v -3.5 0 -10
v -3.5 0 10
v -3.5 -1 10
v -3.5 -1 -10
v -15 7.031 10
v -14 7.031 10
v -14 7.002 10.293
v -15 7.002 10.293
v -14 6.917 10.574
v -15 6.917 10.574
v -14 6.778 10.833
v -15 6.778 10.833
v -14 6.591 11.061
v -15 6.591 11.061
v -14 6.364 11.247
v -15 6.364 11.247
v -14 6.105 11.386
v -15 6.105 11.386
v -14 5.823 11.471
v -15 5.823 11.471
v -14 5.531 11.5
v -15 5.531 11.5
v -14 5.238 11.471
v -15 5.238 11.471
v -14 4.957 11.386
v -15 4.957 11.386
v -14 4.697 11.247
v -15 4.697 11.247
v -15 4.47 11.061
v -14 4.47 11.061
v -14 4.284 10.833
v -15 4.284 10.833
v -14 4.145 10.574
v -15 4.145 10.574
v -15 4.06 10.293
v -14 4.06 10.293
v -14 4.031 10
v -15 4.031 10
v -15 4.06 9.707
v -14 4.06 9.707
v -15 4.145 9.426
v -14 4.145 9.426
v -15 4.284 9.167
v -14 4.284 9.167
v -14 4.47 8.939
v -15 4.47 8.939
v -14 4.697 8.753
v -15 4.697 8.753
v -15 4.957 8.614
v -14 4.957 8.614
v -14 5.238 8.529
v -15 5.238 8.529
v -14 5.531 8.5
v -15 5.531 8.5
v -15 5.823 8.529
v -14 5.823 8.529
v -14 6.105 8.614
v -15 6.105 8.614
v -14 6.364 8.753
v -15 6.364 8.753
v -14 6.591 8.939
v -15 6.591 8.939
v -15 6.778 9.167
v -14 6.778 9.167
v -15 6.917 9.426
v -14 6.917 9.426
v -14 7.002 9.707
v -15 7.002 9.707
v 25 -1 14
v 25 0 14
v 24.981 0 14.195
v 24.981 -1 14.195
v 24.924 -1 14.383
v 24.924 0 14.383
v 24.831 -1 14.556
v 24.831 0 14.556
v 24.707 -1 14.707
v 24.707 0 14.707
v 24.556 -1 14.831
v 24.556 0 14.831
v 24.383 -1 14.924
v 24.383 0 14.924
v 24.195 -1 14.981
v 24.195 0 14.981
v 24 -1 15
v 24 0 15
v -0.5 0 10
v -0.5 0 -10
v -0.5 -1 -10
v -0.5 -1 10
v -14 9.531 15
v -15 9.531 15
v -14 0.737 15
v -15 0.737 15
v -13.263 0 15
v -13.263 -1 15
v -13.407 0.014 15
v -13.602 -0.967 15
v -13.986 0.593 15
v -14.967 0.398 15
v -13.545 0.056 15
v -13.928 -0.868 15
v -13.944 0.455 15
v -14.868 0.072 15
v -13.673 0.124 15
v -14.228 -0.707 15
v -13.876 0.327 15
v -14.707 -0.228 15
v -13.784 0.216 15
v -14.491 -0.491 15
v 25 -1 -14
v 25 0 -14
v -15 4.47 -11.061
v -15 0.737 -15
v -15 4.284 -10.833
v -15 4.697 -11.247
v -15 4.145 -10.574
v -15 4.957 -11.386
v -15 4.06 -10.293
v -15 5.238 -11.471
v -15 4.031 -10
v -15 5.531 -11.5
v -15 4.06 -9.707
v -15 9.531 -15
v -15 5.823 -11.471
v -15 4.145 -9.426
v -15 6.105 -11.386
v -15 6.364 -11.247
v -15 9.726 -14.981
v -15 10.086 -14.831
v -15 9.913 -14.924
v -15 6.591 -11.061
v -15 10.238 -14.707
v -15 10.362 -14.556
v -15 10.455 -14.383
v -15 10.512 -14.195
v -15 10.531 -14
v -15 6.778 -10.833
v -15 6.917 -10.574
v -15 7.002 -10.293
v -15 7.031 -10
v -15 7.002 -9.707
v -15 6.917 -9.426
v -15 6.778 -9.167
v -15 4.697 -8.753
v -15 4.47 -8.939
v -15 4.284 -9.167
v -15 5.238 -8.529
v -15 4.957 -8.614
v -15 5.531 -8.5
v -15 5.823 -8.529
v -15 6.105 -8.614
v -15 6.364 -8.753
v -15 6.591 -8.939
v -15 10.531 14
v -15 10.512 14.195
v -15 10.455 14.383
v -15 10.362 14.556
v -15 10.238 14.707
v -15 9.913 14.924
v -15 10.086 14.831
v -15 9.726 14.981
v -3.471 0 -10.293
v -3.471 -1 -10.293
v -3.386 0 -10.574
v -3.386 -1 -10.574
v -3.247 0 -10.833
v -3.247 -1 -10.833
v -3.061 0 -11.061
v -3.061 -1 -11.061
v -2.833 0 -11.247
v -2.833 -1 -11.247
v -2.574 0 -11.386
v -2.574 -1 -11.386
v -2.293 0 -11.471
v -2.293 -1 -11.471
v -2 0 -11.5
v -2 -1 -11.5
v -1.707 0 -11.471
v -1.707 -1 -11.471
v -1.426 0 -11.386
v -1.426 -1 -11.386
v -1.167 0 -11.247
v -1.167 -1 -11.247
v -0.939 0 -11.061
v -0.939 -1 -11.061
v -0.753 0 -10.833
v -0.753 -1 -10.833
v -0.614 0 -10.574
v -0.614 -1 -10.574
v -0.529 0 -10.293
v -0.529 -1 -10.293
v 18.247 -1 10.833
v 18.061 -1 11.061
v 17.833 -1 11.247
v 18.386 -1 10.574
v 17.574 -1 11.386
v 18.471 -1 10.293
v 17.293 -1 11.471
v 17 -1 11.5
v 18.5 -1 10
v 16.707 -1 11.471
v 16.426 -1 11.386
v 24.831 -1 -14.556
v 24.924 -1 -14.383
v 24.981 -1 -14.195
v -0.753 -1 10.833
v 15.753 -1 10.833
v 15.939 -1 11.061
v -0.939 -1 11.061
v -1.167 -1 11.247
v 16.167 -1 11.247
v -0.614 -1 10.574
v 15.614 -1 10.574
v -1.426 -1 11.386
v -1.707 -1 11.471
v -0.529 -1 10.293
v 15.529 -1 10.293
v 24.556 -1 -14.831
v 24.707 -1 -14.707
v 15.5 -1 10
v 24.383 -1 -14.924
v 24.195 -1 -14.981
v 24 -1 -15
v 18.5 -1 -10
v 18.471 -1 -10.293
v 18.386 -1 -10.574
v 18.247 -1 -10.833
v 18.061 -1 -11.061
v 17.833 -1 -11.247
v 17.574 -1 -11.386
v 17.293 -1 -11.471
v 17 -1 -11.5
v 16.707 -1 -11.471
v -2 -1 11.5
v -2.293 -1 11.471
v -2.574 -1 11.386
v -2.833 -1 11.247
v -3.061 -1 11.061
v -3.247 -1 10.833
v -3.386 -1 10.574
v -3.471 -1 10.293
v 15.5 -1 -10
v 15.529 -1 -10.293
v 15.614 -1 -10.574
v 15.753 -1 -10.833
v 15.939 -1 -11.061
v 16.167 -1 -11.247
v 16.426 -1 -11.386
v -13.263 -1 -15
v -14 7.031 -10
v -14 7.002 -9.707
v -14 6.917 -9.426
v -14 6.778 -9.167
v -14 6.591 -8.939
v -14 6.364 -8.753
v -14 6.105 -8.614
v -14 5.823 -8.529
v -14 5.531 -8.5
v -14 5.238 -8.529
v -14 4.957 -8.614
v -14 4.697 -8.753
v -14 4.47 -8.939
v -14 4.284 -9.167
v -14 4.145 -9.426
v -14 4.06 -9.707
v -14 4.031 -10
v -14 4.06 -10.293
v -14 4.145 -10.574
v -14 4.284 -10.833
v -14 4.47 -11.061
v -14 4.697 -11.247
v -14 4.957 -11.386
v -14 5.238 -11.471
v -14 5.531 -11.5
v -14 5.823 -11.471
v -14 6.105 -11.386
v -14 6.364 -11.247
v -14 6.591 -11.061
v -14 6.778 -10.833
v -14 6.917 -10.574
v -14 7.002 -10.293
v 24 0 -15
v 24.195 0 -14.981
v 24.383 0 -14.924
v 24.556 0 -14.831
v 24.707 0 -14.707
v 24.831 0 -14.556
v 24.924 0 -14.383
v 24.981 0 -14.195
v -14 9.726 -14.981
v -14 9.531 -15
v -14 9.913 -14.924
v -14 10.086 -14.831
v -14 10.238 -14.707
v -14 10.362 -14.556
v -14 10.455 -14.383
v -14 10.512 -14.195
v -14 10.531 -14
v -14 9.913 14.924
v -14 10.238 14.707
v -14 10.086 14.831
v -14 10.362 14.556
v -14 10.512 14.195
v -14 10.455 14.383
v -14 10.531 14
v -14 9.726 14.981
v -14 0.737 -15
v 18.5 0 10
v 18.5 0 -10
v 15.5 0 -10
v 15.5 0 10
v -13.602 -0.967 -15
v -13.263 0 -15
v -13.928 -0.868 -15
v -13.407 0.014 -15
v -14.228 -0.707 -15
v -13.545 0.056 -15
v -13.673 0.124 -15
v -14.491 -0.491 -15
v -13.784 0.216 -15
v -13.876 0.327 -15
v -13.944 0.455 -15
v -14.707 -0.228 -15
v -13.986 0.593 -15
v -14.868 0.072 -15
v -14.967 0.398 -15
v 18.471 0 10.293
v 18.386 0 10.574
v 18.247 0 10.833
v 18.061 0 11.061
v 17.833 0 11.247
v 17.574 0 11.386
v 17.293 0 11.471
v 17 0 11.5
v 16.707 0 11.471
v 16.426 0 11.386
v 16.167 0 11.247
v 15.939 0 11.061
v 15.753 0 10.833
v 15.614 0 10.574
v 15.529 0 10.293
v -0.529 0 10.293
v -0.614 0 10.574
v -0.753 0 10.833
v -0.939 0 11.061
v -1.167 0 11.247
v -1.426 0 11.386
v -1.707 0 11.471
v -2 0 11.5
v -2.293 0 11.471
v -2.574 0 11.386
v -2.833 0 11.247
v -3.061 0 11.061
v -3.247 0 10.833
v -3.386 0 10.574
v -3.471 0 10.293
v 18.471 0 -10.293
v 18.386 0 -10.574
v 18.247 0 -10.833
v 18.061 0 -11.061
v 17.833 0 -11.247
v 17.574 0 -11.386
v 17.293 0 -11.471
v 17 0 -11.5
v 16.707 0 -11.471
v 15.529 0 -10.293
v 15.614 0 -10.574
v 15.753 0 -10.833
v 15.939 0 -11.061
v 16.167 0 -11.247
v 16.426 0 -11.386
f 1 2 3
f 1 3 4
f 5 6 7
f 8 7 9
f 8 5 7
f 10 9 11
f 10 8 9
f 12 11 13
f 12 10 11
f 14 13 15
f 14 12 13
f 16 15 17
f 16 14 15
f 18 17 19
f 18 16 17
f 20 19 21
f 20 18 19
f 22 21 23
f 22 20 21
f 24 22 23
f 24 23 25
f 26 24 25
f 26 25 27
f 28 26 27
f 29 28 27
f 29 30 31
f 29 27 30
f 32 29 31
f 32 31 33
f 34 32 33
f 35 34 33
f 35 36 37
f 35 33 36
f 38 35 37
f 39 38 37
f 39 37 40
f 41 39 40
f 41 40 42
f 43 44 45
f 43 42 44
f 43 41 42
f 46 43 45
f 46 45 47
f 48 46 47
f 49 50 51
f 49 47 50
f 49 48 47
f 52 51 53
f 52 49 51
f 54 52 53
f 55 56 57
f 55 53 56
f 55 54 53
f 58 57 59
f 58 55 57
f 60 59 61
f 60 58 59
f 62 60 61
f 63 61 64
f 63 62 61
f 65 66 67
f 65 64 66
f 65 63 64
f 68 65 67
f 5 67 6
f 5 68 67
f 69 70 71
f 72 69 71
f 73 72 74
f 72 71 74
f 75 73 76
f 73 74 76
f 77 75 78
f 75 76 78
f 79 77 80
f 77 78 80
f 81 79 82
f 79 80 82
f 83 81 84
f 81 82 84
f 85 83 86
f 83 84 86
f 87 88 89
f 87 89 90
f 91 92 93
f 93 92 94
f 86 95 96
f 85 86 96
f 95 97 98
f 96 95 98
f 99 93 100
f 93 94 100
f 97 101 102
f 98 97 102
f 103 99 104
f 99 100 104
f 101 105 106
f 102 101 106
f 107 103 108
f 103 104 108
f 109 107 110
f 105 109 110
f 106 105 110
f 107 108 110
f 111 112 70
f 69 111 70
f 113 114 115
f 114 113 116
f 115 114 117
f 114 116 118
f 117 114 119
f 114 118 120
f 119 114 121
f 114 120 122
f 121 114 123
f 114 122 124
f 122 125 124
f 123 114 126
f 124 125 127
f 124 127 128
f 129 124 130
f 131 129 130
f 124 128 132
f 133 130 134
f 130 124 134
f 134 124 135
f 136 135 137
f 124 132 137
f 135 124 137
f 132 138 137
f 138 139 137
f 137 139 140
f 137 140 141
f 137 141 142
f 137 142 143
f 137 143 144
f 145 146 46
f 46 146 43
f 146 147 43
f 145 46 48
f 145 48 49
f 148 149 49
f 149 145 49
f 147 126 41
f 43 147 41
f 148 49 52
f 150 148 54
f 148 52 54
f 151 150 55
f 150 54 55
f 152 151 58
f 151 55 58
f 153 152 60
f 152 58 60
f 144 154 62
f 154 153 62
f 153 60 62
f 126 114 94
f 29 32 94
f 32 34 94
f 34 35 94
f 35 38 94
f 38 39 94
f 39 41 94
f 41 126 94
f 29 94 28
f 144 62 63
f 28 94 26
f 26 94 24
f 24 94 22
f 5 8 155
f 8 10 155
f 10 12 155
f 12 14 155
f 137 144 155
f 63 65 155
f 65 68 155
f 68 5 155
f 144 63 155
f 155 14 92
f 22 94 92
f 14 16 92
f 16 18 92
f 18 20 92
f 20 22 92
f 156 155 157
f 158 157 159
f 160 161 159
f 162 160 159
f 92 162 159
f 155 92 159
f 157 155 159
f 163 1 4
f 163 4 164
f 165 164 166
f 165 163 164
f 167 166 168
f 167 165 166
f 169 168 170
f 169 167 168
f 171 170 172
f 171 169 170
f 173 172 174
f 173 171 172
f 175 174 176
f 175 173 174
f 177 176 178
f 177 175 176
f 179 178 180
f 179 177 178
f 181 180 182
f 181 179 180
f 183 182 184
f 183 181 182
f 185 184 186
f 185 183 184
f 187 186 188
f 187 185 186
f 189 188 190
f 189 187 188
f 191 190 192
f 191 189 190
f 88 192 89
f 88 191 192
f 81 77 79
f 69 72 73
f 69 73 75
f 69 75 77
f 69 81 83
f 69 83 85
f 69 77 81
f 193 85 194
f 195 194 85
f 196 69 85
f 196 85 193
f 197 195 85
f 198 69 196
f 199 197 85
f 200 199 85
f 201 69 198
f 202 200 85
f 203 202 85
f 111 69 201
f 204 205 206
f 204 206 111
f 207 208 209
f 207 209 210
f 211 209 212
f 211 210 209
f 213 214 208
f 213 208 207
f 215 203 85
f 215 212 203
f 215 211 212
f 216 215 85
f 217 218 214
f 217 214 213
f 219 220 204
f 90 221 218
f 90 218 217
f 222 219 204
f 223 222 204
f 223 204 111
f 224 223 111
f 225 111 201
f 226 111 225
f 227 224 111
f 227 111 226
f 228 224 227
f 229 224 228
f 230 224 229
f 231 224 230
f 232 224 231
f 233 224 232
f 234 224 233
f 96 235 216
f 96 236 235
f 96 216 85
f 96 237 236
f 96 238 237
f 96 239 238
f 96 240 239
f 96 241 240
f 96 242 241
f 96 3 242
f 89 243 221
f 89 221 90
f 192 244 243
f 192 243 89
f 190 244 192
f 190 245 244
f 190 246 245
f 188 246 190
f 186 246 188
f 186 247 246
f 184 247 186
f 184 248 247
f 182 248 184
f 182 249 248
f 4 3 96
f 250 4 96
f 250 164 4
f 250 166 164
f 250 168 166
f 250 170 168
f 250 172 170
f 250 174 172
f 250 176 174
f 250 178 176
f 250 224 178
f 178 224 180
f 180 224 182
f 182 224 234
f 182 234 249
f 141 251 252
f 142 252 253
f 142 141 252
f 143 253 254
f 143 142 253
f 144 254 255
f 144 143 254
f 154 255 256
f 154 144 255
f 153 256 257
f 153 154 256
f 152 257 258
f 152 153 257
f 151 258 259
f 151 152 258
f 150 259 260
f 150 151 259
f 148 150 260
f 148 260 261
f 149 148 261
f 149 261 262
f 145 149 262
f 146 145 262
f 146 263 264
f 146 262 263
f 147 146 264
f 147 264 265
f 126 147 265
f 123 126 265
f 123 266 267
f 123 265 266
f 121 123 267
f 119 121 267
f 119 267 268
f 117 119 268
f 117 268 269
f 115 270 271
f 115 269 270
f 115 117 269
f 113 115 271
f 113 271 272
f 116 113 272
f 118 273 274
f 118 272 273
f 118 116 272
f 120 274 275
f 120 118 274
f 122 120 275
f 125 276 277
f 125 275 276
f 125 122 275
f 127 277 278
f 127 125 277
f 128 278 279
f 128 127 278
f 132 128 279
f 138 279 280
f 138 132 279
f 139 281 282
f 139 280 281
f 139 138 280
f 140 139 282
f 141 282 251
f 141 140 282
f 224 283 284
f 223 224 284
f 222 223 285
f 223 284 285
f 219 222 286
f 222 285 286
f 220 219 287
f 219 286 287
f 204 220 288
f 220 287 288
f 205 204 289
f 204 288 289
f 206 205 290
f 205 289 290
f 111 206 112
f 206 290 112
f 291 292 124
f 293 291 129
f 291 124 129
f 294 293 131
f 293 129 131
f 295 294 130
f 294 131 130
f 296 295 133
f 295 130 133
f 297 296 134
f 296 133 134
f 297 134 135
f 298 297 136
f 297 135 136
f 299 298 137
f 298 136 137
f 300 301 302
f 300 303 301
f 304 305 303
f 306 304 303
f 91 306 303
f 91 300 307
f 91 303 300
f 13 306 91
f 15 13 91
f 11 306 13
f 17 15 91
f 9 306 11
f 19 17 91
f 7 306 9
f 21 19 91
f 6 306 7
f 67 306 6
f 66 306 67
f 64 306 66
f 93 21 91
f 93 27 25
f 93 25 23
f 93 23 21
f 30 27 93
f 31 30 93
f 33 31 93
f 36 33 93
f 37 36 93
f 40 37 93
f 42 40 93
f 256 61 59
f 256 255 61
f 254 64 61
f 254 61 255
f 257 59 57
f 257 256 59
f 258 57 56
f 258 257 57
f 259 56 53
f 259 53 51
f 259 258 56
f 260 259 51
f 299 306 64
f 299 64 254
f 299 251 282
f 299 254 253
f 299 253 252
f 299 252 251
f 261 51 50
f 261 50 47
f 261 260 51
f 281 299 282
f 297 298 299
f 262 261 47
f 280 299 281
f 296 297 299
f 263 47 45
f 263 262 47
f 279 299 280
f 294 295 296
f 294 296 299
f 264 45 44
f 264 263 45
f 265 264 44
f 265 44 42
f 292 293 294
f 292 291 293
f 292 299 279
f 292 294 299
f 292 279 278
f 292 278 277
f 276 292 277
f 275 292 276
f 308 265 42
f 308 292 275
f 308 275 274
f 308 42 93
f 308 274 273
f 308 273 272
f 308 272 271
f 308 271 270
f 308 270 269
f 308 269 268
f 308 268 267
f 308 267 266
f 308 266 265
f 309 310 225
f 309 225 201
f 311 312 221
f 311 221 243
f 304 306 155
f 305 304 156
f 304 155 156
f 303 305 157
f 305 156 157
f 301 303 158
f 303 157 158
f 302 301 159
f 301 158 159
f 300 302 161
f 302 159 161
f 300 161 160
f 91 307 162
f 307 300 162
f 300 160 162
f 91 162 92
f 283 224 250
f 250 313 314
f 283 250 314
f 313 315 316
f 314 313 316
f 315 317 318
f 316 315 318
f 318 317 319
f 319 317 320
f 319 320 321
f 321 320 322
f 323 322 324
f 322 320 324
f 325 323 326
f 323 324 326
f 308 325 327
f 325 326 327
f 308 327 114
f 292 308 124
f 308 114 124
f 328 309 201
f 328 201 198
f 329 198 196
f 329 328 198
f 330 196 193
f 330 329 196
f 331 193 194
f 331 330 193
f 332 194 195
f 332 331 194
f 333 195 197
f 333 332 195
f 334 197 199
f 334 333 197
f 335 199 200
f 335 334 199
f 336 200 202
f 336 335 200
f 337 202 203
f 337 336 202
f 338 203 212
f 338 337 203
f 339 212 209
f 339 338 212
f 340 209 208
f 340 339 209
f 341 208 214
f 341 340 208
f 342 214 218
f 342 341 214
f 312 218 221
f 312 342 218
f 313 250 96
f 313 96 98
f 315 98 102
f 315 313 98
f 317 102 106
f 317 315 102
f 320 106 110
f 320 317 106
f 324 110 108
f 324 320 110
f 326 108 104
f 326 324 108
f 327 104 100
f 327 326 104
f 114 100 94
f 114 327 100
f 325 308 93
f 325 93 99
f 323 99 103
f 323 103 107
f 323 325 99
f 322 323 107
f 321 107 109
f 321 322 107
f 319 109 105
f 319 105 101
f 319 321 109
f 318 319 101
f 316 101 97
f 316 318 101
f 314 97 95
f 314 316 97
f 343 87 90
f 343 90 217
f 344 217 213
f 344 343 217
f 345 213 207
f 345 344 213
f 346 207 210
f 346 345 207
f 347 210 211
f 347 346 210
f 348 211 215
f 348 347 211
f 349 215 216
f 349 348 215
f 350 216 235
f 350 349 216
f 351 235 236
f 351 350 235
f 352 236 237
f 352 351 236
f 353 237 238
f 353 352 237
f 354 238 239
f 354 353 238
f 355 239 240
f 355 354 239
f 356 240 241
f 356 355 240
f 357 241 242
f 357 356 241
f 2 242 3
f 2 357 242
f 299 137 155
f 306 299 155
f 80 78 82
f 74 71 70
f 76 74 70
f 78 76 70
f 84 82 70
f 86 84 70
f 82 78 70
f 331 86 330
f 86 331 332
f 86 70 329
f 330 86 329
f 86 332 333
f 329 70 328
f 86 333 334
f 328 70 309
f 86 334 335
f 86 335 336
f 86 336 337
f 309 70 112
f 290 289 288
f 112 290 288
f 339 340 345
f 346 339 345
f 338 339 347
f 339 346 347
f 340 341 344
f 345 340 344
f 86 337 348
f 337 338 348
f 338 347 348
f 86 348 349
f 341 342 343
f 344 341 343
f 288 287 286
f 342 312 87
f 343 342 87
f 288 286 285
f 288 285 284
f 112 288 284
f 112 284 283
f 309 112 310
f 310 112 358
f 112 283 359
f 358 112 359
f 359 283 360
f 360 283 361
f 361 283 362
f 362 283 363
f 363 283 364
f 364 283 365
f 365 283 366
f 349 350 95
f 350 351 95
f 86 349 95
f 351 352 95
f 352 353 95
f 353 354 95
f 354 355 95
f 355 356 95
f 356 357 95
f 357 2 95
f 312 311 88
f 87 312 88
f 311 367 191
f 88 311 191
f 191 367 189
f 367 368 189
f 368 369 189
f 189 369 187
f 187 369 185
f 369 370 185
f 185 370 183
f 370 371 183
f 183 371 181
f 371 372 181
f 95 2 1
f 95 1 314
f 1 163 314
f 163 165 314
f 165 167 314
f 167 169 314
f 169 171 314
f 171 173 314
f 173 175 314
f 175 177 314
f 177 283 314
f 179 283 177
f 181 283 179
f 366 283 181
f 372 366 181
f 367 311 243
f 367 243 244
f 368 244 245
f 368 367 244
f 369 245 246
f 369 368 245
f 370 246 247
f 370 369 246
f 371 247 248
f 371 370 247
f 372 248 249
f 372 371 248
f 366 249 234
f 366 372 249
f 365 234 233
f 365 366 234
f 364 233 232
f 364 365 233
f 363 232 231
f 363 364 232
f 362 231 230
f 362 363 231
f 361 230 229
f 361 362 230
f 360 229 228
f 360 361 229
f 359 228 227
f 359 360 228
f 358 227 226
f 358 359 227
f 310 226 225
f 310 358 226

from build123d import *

# Parameters (mm, degrees)
SKETCH_1_R             = 1.5
SM_BASE_FLANGE_1_DEPTH = 1
OTHER_START            = -25
OTHER_1_OUTLINE_W      = 1
OTHER_1_OUTLINE_H      = 30
OTHER_1_DEPTH          = 10
OTHER_START_2          = -14.831098284
OTHER_1_2_OUTLINE_R    = 1.5
OTHER_1_2_DEPTH        = 0.831098284
OTHER_START_3          = -15
OTHER_1_3_OUTLINE_R    = 1.5
OTHER_1_3_DEPTH        = 1.7366
OTHER_1_4_DEPTH        = 30


with BuildPart() as part:
    # 基体-法兰1: sheet metal written as solids
    # Sketch 1 → 基体-法兰1 (new body)
    with BuildSketch(Plane(origin=(0, 0, 0), x_dir=(1, 0, 0), z_dir=(0, 1, 0))):
        with BuildLine():
            Line((-24, 15), (24, 15))
            ThreePointArc((24, 15), (24.707106781, 14.707106781), (25, 14))
            Line((25, 14), (25, -14))
            ThreePointArc((25, -14), (24.707106781, -14.707106781), (24, -15))
            Line((24, -15), (-24, -15))
            ThreePointArc((-24, -15), (-24.707106781, -14.707106781), (-25, -14))
            Line((-25, -14), (-25, 14))
            ThreePointArc((-25, 14), (-24.707106781, 14.707106781), (-24, 15))
        make_face()
        with Locations(Location((-20, -10, 0), (0, 0, 270))):
            Circle(SKETCH_1_R, mode=Mode.SUBTRACT)
        with Locations(Location((-20, 10, 0), (0, 0, 270))):
            Circle(SKETCH_1_R, mode=Mode.SUBTRACT)
        with BuildLine():
            Line((-3.5, -10), (-3.5, 10))
            ThreePointArc((-3.5, 10), (-2, 11.5), (-0.5, 10))
            Line((-0.5, 10), (-0.5, -10))
            ThreePointArc((-0.5, -10), (-2, -11.5), (-3.5, -10))
        make_face(mode=Mode.SUBTRACT)
        with BuildLine():
            Line((15.5, -10), (15.5, 10))
            ThreePointArc((15.5, 10), (17, 11.5), (18.5, 10))
            Line((18.5, 10), (18.5, -10))
            ThreePointArc((18.5, -10), (17, -11.5), (15.5, -10))
        make_face(mode=Mode.SUBTRACT)
    extrude(amount=-SM_BASE_FLANGE_1_DEPTH)

    # Other 1: read off the stored shape, not the designer's step
    # Other 1 outline → Other 1 (cut)
    with BuildSketch(Plane.YZ.offset(OTHER_START)):
        with Locations((-0.5, 0)):
            Rectangle(OTHER_1_OUTLINE_W, OTHER_1_OUTLINE_H)
    extrude(amount=OTHER_1_DEPTH, mode=Mode.SUBTRACT)

    # Other 1 2 outline → Other 1 2 (add)
    with BuildSketch(Plane.YZ.offset(OTHER_START_2)):
        with BuildLine():
            ThreePointArc((10.530753262, 14), (10.237860043, 14.707106781), (9.530753262, 15))
            Line((9.530753262, 15), (0, 15))
            Line((0, 15), (0, -15))
            Line((0, -15), (9.530753262, -15))
            ThreePointArc((9.530753262, -15), (10.237860043, -14.707106781), (10.530753262, -14))
            Line((10.530753262, -14), (10.530753262, 14))
        make_face()
        with Locations((5.530753262, -10)):
            Circle(OTHER_1_2_OUTLINE_R, mode=Mode.SUBTRACT)
        with Locations((5.530753262, 10)):
            Circle(OTHER_1_2_OUTLINE_R, mode=Mode.SUBTRACT)
    extrude(amount=OTHER_1_2_DEPTH)

    # Other 1 3 outline → Other 1 3 (add)
    with BuildSketch(Plane.YZ.offset(OTHER_START_3)):
        with BuildLine():
            ThreePointArc((10.530753262, 14), (10.237860043, 14.707106781), (9.530753262, 15))
            Line((9.530753262, 15), (0, 15))
            Line((0, 15), (0, -15))
            Line((0, -15), (9.530753262, -15))
            ThreePointArc((9.530753262, -15), (10.237860043, -14.707106781), (10.530753262, -14))
            Line((10.530753262, -14), (10.530753262, 14))
        make_face()
        with Locations((5.530753262, -10)):
            Circle(OTHER_1_3_OUTLINE_R, mode=Mode.SUBTRACT)
        with Locations((5.530753262, 10)):
            Circle(OTHER_1_3_OUTLINE_R, mode=Mode.SUBTRACT)
    extrude(amount=OTHER_1_3_DEPTH)

    # Other 1 4 outline → Other 1 4 (cut)
    with BuildSketch(Plane.XY.offset(OTHER_START_3)):
        with BuildLine():
            ThreePointArc((-13.2634, -1), (-14.491361636, -0.491361636), (-15, 0.7366))
            Line((-15, 0.7366), (-15, -1))
            Line((-15, -1), (-13.2634, -1))
        make_face()
        with BuildLine():
            Line((-14, 10.530753262), (-14, 0.7366))
            ThreePointArc((-14, 0.7366), (-13.784254855, 0.215745145), (-13.2634, 0))
            Line((-13.2634, 0), (-13.2634, 10.530753262))
            Line((-13.2634, 10.530753262), (-14, 10.530753262))
        make_face()
    extrude(amount=OTHER_1_4_DEPTH, mode=Mode.SUBTRACT)


solid = part.part
